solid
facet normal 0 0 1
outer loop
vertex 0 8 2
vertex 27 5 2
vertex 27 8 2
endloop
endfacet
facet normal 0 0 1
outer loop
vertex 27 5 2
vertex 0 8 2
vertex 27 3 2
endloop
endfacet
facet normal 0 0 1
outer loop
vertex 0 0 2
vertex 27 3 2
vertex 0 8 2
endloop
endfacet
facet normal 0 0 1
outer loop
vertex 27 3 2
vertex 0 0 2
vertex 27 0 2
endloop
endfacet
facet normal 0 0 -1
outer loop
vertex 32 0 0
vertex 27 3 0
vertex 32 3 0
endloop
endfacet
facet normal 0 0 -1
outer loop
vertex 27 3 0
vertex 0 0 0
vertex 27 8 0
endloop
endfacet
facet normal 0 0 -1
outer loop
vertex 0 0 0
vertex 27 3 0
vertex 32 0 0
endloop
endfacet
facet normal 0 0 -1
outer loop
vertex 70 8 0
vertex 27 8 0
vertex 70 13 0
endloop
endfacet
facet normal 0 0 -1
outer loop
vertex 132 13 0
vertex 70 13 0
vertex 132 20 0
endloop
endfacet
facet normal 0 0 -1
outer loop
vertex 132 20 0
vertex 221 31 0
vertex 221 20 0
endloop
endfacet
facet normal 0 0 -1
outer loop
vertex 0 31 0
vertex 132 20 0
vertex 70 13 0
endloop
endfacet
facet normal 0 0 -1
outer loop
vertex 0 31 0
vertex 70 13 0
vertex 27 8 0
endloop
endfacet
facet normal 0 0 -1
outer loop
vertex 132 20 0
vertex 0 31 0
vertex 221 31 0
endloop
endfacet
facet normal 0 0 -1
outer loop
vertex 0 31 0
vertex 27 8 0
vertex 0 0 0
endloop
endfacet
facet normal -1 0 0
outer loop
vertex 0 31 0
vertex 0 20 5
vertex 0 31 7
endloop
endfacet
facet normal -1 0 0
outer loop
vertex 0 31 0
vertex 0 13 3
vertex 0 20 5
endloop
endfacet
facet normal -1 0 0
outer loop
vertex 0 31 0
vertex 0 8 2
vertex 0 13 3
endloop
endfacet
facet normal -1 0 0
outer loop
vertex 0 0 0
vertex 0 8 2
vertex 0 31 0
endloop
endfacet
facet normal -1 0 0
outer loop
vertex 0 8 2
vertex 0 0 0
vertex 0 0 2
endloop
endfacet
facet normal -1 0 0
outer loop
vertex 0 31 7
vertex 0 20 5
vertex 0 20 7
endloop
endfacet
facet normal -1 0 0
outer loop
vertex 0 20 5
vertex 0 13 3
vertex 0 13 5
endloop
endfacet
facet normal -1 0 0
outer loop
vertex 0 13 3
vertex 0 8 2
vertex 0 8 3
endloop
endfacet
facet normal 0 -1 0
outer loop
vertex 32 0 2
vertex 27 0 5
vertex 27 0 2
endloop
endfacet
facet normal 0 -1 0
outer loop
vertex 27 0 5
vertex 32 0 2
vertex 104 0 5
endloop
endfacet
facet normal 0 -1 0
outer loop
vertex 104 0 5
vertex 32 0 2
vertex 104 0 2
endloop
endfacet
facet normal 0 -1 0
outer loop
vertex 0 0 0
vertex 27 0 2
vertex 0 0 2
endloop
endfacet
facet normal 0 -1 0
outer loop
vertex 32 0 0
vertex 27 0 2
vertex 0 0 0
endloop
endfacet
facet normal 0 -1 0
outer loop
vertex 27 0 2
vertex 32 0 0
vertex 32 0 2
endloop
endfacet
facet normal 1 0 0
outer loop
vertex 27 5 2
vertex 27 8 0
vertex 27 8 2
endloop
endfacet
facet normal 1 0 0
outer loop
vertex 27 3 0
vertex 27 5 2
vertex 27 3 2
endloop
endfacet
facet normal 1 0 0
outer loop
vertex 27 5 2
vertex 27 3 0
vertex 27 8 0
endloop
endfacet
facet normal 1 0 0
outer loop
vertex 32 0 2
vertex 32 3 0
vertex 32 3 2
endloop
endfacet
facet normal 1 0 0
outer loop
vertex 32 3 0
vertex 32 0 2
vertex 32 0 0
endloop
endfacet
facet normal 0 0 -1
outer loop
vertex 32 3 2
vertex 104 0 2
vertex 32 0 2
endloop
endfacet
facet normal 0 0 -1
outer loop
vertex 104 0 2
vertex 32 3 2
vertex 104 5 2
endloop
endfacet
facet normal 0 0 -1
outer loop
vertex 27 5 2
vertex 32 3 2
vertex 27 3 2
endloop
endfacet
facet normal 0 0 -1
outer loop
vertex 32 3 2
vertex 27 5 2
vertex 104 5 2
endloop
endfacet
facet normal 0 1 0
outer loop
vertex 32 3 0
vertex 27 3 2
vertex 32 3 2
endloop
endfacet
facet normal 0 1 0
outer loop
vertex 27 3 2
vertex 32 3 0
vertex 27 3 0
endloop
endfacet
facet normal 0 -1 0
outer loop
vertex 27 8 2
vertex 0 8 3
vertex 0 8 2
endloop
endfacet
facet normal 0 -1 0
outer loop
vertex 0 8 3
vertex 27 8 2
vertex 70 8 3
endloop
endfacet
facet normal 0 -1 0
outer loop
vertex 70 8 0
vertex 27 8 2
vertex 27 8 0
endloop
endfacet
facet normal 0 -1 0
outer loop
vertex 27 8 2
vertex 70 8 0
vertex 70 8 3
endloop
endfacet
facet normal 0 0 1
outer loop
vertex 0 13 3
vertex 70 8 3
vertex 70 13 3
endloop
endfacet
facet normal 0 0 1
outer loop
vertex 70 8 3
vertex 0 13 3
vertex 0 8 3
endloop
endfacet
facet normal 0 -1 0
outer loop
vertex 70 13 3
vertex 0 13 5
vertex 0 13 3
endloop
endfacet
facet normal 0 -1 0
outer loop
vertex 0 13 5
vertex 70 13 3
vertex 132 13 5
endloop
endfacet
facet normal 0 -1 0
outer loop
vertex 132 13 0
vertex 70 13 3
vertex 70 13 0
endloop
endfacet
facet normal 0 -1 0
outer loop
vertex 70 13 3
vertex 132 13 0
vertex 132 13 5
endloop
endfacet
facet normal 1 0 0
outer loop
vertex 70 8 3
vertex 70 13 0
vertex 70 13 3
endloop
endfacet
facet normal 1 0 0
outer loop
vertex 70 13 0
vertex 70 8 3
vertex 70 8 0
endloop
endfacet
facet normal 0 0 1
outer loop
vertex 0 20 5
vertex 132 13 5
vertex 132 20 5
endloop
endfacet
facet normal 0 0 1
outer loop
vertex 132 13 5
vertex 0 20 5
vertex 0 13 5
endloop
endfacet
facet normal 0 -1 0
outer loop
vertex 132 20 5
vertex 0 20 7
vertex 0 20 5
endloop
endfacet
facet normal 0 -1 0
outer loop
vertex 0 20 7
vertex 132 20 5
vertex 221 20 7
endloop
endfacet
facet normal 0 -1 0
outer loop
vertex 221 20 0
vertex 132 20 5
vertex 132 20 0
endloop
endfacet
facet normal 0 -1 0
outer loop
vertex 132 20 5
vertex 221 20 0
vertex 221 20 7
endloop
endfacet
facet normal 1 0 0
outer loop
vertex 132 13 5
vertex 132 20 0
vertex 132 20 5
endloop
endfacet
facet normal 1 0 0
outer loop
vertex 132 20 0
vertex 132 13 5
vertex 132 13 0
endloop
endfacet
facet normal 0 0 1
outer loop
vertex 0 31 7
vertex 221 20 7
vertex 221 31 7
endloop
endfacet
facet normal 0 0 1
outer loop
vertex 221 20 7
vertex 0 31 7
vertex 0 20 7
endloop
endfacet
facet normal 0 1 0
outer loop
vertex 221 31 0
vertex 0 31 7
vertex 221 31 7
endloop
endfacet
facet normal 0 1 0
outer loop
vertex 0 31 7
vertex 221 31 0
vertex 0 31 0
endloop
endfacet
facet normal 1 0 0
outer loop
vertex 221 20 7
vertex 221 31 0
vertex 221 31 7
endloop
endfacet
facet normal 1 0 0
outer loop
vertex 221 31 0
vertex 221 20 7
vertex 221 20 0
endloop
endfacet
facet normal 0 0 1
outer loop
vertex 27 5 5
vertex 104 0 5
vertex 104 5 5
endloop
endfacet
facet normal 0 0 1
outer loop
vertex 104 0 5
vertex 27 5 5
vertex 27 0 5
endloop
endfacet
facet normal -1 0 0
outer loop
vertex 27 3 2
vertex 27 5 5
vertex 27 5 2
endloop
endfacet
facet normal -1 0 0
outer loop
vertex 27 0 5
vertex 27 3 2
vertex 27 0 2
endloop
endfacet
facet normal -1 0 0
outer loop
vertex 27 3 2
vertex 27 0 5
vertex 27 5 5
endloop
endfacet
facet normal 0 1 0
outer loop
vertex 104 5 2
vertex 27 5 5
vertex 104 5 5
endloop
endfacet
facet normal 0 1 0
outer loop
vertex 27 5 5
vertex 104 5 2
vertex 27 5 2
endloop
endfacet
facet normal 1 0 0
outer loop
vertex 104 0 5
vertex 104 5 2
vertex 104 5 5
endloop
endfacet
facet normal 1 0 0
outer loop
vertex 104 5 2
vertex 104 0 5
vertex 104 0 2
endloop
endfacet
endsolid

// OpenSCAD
translate([2.5, 1.5, 1.0]) color([0.15341277093142425, 0.6908227578732097, 0.4579542036471842]) cube([5, 3, 2], center=true);
translate([8.5, 1.5, 1.0]) color([0.07907378923830799, 0.7390161160059011, 0.5443194976514814]) cube([7, 3, 2], center=true);
translate([14.5, 1.5, 1.0]) color([0.13483760684825774, 0.7621666562045316, 0.4818270828740713]) cube([5, 3, 2], center=true);
translate([19.5, 1.5, 1.0]) color([0.6101356542697393, 0.673403459483394, 0.5902776863195436]) cube([5, 3, 2], center=true);
translate([24.5, 1.5, 1.0]) color([0.8919435414206076, 0.8537743808409336, 0.1323442810447465]) cube([5, 3, 2], center=true);
translate([29.5, 1.5, 1.0]) color([0.3102975814641805, 0.7484858811975865, 0.8289027709575956]) cube([5, 3, 2], center=true);
translate([2.5, 5.5, 1.0]) color([0.08072310687247075, 0.594576926472109, 0.6985826889753467]) cube([5, 5, 2], center=true);
translate([8.5, 5.5, 1.0]) color([0.16007977902454107, 0.22309782085865282, 0.4481353266436462]) cube([7, 5, 2], center=true);
translate([14.5, 5.5, 1.0]) color([0.7103499760882809, 0.6737752003084974, 0.8745376498580455]) cube([5, 5, 2], center=true);
translate([19.5, 5.5, 1.0]) color([0.03154547812243602, 0.8716881923513831, 0.5674723417924832]) cube([5, 5, 2], center=true);
translate([24.5, 5.5, 1.0]) color([0.7721857179864934, 0.709006034186331, 0.16567497287207977]) cube([5, 5, 2], center=true);
translate([3.5, 10.5, 1.5]) color([0.06388630911131887, 0.7015161675042403, 0.44636471217552665]) cube([7, 5, 3], center=true);
translate([10.5, 10.5, 1.5]) color([0.8849455079977631, 0.9080398571595916, 0.603977387811875]) cube([7, 5, 3], center=true);
translate([17.5, 10.5, 1.5]) color([6.916287448366365e-05, 0.03891018401520452, 0.3259439044599104]) cube([7, 5, 3], center=true);
translate([24.5, 10.5, 1.5]) color([0.8377368410445171, 0.049856996603651726, 0.8227199232206964]) cube([7, 5, 3], center=true);
translate([31.5, 10.5, 1.5]) color([0.9741768822998921, 0.41513741156459816, 0.5485620647625651]) cube([7, 5, 3], center=true);
translate([38.5, 10.5, 1.5]) color([0.9630377712330874, 0.9785717508455145, 0.8374483937438901]) cube([7, 5, 3], center=true);
translate([45.5, 10.5, 1.5]) color([0.13052175184206272, 0.014729286743825787, 0.9495475342759118]) cube([7, 5, 3], center=true);
translate([52.5, 10.5, 1.5]) color([0.4174850755645121, 0.003392809730206836, 0.014291314164728952]) cube([7, 5, 3], center=true);
translate([59.5, 10.5, 1.5]) color([0.7547538206156906, 0.9802446426654712, 0.6757618973280934]) cube([7, 5, 3], center=true);
translate([66.5, 10.5, 1.5]) color([0.6120619632138635, 0.19045993029254593, 0.6083596397136556]) cube([7, 5, 3], center=true);
translate([5.5, 16.5, 2.5]) color([0.19851637537519495, 0.30241604357944973, 0.6885400040337084]) cube([11, 7, 5], center=true);
translate([16.5, 16.5, 2.5]) color([0.1822211451841942, 0.4756054792846598, 0.9227697282783401]) cube([11, 7, 5], center=true);
translate([27.5, 16.5, 2.5]) color([0.6276391005616293, 0.021845499237729826, 0.9138811115397377]) cube([11, 7, 5], center=true);
translate([38.5, 16.5, 2.5]) color([0.7998245566512758, 0.11577939883887689, 0.25648877124056624]) cube([11, 7, 5], center=true);
translate([49.5, 16.5, 2.5]) color([0.6535669902031535, 0.8172732193081321, 0.644940669440128]) cube([11, 7, 5], center=true);
translate([60.5, 16.5, 2.5]) color([0.11510934585231414, 0.15444013683803237, 0.8512397484375114]) cube([11, 7, 5], center=true);
translate([71.5, 16.5, 2.5]) color([0.04229760200279409, 0.20573574066904754, 0.25966938255992333]) cube([11, 7, 5], center=true);
translate([82.5, 16.5, 2.5]) color([0.31471323182063216, 0.3668937976542025, 0.5674677931506273]) cube([11, 7, 5], center=true);
translate([93.5, 16.5, 2.5]) color([0.849437788441811, 0.8463599216128499, 0.9612029098073006]) cube([11, 7, 5], center=true);
translate([104.5, 16.5, 2.5]) color([0.6075964991402765, 0.49448567414550215, 0.6441434540056448]) cube([11, 7, 5], center=true);
translate([115.5, 16.5, 2.5]) color([0.45866436243162445, 0.4354406175944898, 0.8714107315087972]) cube([11, 7, 5], center=true);
translate([126.5, 16.5, 2.5]) color([0.17828831976535986, 0.3755789219373874, 0.2910354883141598]) cube([11, 7, 5], center=true);
translate([6.5, 25.5, 3.5]) color([0.1384569492267308, 0.27137343088841726, 0.3375110685052213]) cube([13, 11, 7], center=true);
translate([19.5, 25.5, 3.5]) color([0.3672014751918571, 0.09370751185905901, 0.7794169159273662]) cube([13, 11, 7], center=true);
translate([32.5, 25.5, 3.5]) color([0.03566546768846324, 0.26962214085355807, 0.14941603676910742]) cube([13, 11, 7], center=true);
translate([45.5, 25.5, 3.5]) color([0.583451176356754, 0.36090661134415847, 0.9893030267095886]) cube([13, 11, 7], center=true);
translate([58.5, 25.5, 3.5]) color([0.12964093903755392, 0.11489641277540219, 0.7305217328645741]) cube([13, 11, 7], center=true);
translate([71.5, 25.5, 3.5]) color([0.933754079403403, 0.30787976219942303, 0.8570365795720385]) cube([13, 11, 7], center=true);
translate([84.5, 25.5, 3.5]) color([0.7286607479368364, 0.3026706606385793, 0.8355597356596641]) cube([13, 11, 7], center=true);
translate([97.5, 25.5, 3.5]) color([0.2992255048060537, 0.1086514152541781, 0.5608299889315482]) cube([13, 11, 7], center=true);
translate([110.5, 25.5, 3.5]) color([0.4811722969562161, 0.3370805445376659, 0.7978743610995221]) cube([13, 11, 7], center=true);
translate([123.5, 25.5, 3.5]) color([0.8123286615584164, 0.12432480215345709, 0.11600806340273684]) cube([13, 11, 7], center=true);
translate([136.5, 25.5, 3.5]) color([0.49773452003699037, 0.03782437966691787, 0.3350819106008931]) cube([13, 11, 7], center=true);
translate([149.5, 25.5, 3.5]) color([0.6871104903101904, 0.1556641006446543, 0.16655617674247947]) cube([13, 11, 7], center=true);
translate([162.5, 25.5, 3.5]) color([0.5644873855678092, 0.8061184955728092, 0.9914997491156944]) cube([13, 11, 7], center=true);
translate([175.5, 25.5, 3.5]) color([0.08692177434142434, 0.8077725699891862, 0.19804028235278703]) cube([13, 11, 7], center=true);
translate([188.5, 25.5, 3.5]) color([0.22105871931579824, 0.38481190061458204, 0.09807651038324794]) cube([13, 11, 7], center=true);
translate([201.5, 25.5, 3.5]) color([0.5564746075794378, 0.289820808533909, 0.9201526827262252]) cube([13, 11, 7], center=true);
translate([214.5, 25.5, 3.5]) color([0.7882887690133504, 0.714406368727256, 0.21725354658840645]) cube([13, 11, 7], center=true);
translate([30.5, 2.5, 3.5]) color([0.08366324281939452, 0.2201378642652858, 0.9991066326269249]) cube([7, 5, 3], center=true);
translate([37.5, 2.5, 3.5]) color([0.5852279869996022, 0.1665811123789923, 0.1919450116047291]) cube([7, 5, 3], center=true);
translate([44.5, 2.5, 3.5]) color([0.1150124003280546, 0.8219806914298157, 0.8528586901873659]) cube([7, 5, 3], center=true);
translate([51.5, 2.5, 3.5]) color([0.02761895137288195, 0.5258157137901469, 0.752438401258893]) cube([7, 5, 3], center=true);
translate([58.5, 2.5, 3.5]) color([0.20168791799925478, 0.4970874741521001, 0.2564796746315954]) cube([7, 5, 3], center=true);
translate([65.5, 2.5, 3.5]) color([0.6409972685732053, 0.9970404948887329, 0.797433214008021]) cube([7, 5, 3], center=true);
translate([72.5, 2.5, 3.5]) color([0.6234150837835258, 0.10462968943990791, 0.4584080456050631]) cube([7, 5, 3], center=true);
translate([79.5, 2.5, 3.5]) color([0.3616420965372864, 0.8269865896652219, 0.10474628201641056]) cube([7, 5, 3], center=true);
translate([86.5, 2.5, 3.5]) color([0.596240475647071, 0.48790140560568873, 0.5639041170917963]) cube([7, 5, 3], center=true);
translate([93.5, 2.5, 3.5]) color([0.6383635452384463, 0.42323888002080157, 0.5212286449626529]) cube([7, 5, 3], center=true);
translate([100.5, 2.5, 3.5]) color([0.6793183678168555, 0.8877818831984722, 0.8335334993782705]) cube([7, 5, 3], center=true);
